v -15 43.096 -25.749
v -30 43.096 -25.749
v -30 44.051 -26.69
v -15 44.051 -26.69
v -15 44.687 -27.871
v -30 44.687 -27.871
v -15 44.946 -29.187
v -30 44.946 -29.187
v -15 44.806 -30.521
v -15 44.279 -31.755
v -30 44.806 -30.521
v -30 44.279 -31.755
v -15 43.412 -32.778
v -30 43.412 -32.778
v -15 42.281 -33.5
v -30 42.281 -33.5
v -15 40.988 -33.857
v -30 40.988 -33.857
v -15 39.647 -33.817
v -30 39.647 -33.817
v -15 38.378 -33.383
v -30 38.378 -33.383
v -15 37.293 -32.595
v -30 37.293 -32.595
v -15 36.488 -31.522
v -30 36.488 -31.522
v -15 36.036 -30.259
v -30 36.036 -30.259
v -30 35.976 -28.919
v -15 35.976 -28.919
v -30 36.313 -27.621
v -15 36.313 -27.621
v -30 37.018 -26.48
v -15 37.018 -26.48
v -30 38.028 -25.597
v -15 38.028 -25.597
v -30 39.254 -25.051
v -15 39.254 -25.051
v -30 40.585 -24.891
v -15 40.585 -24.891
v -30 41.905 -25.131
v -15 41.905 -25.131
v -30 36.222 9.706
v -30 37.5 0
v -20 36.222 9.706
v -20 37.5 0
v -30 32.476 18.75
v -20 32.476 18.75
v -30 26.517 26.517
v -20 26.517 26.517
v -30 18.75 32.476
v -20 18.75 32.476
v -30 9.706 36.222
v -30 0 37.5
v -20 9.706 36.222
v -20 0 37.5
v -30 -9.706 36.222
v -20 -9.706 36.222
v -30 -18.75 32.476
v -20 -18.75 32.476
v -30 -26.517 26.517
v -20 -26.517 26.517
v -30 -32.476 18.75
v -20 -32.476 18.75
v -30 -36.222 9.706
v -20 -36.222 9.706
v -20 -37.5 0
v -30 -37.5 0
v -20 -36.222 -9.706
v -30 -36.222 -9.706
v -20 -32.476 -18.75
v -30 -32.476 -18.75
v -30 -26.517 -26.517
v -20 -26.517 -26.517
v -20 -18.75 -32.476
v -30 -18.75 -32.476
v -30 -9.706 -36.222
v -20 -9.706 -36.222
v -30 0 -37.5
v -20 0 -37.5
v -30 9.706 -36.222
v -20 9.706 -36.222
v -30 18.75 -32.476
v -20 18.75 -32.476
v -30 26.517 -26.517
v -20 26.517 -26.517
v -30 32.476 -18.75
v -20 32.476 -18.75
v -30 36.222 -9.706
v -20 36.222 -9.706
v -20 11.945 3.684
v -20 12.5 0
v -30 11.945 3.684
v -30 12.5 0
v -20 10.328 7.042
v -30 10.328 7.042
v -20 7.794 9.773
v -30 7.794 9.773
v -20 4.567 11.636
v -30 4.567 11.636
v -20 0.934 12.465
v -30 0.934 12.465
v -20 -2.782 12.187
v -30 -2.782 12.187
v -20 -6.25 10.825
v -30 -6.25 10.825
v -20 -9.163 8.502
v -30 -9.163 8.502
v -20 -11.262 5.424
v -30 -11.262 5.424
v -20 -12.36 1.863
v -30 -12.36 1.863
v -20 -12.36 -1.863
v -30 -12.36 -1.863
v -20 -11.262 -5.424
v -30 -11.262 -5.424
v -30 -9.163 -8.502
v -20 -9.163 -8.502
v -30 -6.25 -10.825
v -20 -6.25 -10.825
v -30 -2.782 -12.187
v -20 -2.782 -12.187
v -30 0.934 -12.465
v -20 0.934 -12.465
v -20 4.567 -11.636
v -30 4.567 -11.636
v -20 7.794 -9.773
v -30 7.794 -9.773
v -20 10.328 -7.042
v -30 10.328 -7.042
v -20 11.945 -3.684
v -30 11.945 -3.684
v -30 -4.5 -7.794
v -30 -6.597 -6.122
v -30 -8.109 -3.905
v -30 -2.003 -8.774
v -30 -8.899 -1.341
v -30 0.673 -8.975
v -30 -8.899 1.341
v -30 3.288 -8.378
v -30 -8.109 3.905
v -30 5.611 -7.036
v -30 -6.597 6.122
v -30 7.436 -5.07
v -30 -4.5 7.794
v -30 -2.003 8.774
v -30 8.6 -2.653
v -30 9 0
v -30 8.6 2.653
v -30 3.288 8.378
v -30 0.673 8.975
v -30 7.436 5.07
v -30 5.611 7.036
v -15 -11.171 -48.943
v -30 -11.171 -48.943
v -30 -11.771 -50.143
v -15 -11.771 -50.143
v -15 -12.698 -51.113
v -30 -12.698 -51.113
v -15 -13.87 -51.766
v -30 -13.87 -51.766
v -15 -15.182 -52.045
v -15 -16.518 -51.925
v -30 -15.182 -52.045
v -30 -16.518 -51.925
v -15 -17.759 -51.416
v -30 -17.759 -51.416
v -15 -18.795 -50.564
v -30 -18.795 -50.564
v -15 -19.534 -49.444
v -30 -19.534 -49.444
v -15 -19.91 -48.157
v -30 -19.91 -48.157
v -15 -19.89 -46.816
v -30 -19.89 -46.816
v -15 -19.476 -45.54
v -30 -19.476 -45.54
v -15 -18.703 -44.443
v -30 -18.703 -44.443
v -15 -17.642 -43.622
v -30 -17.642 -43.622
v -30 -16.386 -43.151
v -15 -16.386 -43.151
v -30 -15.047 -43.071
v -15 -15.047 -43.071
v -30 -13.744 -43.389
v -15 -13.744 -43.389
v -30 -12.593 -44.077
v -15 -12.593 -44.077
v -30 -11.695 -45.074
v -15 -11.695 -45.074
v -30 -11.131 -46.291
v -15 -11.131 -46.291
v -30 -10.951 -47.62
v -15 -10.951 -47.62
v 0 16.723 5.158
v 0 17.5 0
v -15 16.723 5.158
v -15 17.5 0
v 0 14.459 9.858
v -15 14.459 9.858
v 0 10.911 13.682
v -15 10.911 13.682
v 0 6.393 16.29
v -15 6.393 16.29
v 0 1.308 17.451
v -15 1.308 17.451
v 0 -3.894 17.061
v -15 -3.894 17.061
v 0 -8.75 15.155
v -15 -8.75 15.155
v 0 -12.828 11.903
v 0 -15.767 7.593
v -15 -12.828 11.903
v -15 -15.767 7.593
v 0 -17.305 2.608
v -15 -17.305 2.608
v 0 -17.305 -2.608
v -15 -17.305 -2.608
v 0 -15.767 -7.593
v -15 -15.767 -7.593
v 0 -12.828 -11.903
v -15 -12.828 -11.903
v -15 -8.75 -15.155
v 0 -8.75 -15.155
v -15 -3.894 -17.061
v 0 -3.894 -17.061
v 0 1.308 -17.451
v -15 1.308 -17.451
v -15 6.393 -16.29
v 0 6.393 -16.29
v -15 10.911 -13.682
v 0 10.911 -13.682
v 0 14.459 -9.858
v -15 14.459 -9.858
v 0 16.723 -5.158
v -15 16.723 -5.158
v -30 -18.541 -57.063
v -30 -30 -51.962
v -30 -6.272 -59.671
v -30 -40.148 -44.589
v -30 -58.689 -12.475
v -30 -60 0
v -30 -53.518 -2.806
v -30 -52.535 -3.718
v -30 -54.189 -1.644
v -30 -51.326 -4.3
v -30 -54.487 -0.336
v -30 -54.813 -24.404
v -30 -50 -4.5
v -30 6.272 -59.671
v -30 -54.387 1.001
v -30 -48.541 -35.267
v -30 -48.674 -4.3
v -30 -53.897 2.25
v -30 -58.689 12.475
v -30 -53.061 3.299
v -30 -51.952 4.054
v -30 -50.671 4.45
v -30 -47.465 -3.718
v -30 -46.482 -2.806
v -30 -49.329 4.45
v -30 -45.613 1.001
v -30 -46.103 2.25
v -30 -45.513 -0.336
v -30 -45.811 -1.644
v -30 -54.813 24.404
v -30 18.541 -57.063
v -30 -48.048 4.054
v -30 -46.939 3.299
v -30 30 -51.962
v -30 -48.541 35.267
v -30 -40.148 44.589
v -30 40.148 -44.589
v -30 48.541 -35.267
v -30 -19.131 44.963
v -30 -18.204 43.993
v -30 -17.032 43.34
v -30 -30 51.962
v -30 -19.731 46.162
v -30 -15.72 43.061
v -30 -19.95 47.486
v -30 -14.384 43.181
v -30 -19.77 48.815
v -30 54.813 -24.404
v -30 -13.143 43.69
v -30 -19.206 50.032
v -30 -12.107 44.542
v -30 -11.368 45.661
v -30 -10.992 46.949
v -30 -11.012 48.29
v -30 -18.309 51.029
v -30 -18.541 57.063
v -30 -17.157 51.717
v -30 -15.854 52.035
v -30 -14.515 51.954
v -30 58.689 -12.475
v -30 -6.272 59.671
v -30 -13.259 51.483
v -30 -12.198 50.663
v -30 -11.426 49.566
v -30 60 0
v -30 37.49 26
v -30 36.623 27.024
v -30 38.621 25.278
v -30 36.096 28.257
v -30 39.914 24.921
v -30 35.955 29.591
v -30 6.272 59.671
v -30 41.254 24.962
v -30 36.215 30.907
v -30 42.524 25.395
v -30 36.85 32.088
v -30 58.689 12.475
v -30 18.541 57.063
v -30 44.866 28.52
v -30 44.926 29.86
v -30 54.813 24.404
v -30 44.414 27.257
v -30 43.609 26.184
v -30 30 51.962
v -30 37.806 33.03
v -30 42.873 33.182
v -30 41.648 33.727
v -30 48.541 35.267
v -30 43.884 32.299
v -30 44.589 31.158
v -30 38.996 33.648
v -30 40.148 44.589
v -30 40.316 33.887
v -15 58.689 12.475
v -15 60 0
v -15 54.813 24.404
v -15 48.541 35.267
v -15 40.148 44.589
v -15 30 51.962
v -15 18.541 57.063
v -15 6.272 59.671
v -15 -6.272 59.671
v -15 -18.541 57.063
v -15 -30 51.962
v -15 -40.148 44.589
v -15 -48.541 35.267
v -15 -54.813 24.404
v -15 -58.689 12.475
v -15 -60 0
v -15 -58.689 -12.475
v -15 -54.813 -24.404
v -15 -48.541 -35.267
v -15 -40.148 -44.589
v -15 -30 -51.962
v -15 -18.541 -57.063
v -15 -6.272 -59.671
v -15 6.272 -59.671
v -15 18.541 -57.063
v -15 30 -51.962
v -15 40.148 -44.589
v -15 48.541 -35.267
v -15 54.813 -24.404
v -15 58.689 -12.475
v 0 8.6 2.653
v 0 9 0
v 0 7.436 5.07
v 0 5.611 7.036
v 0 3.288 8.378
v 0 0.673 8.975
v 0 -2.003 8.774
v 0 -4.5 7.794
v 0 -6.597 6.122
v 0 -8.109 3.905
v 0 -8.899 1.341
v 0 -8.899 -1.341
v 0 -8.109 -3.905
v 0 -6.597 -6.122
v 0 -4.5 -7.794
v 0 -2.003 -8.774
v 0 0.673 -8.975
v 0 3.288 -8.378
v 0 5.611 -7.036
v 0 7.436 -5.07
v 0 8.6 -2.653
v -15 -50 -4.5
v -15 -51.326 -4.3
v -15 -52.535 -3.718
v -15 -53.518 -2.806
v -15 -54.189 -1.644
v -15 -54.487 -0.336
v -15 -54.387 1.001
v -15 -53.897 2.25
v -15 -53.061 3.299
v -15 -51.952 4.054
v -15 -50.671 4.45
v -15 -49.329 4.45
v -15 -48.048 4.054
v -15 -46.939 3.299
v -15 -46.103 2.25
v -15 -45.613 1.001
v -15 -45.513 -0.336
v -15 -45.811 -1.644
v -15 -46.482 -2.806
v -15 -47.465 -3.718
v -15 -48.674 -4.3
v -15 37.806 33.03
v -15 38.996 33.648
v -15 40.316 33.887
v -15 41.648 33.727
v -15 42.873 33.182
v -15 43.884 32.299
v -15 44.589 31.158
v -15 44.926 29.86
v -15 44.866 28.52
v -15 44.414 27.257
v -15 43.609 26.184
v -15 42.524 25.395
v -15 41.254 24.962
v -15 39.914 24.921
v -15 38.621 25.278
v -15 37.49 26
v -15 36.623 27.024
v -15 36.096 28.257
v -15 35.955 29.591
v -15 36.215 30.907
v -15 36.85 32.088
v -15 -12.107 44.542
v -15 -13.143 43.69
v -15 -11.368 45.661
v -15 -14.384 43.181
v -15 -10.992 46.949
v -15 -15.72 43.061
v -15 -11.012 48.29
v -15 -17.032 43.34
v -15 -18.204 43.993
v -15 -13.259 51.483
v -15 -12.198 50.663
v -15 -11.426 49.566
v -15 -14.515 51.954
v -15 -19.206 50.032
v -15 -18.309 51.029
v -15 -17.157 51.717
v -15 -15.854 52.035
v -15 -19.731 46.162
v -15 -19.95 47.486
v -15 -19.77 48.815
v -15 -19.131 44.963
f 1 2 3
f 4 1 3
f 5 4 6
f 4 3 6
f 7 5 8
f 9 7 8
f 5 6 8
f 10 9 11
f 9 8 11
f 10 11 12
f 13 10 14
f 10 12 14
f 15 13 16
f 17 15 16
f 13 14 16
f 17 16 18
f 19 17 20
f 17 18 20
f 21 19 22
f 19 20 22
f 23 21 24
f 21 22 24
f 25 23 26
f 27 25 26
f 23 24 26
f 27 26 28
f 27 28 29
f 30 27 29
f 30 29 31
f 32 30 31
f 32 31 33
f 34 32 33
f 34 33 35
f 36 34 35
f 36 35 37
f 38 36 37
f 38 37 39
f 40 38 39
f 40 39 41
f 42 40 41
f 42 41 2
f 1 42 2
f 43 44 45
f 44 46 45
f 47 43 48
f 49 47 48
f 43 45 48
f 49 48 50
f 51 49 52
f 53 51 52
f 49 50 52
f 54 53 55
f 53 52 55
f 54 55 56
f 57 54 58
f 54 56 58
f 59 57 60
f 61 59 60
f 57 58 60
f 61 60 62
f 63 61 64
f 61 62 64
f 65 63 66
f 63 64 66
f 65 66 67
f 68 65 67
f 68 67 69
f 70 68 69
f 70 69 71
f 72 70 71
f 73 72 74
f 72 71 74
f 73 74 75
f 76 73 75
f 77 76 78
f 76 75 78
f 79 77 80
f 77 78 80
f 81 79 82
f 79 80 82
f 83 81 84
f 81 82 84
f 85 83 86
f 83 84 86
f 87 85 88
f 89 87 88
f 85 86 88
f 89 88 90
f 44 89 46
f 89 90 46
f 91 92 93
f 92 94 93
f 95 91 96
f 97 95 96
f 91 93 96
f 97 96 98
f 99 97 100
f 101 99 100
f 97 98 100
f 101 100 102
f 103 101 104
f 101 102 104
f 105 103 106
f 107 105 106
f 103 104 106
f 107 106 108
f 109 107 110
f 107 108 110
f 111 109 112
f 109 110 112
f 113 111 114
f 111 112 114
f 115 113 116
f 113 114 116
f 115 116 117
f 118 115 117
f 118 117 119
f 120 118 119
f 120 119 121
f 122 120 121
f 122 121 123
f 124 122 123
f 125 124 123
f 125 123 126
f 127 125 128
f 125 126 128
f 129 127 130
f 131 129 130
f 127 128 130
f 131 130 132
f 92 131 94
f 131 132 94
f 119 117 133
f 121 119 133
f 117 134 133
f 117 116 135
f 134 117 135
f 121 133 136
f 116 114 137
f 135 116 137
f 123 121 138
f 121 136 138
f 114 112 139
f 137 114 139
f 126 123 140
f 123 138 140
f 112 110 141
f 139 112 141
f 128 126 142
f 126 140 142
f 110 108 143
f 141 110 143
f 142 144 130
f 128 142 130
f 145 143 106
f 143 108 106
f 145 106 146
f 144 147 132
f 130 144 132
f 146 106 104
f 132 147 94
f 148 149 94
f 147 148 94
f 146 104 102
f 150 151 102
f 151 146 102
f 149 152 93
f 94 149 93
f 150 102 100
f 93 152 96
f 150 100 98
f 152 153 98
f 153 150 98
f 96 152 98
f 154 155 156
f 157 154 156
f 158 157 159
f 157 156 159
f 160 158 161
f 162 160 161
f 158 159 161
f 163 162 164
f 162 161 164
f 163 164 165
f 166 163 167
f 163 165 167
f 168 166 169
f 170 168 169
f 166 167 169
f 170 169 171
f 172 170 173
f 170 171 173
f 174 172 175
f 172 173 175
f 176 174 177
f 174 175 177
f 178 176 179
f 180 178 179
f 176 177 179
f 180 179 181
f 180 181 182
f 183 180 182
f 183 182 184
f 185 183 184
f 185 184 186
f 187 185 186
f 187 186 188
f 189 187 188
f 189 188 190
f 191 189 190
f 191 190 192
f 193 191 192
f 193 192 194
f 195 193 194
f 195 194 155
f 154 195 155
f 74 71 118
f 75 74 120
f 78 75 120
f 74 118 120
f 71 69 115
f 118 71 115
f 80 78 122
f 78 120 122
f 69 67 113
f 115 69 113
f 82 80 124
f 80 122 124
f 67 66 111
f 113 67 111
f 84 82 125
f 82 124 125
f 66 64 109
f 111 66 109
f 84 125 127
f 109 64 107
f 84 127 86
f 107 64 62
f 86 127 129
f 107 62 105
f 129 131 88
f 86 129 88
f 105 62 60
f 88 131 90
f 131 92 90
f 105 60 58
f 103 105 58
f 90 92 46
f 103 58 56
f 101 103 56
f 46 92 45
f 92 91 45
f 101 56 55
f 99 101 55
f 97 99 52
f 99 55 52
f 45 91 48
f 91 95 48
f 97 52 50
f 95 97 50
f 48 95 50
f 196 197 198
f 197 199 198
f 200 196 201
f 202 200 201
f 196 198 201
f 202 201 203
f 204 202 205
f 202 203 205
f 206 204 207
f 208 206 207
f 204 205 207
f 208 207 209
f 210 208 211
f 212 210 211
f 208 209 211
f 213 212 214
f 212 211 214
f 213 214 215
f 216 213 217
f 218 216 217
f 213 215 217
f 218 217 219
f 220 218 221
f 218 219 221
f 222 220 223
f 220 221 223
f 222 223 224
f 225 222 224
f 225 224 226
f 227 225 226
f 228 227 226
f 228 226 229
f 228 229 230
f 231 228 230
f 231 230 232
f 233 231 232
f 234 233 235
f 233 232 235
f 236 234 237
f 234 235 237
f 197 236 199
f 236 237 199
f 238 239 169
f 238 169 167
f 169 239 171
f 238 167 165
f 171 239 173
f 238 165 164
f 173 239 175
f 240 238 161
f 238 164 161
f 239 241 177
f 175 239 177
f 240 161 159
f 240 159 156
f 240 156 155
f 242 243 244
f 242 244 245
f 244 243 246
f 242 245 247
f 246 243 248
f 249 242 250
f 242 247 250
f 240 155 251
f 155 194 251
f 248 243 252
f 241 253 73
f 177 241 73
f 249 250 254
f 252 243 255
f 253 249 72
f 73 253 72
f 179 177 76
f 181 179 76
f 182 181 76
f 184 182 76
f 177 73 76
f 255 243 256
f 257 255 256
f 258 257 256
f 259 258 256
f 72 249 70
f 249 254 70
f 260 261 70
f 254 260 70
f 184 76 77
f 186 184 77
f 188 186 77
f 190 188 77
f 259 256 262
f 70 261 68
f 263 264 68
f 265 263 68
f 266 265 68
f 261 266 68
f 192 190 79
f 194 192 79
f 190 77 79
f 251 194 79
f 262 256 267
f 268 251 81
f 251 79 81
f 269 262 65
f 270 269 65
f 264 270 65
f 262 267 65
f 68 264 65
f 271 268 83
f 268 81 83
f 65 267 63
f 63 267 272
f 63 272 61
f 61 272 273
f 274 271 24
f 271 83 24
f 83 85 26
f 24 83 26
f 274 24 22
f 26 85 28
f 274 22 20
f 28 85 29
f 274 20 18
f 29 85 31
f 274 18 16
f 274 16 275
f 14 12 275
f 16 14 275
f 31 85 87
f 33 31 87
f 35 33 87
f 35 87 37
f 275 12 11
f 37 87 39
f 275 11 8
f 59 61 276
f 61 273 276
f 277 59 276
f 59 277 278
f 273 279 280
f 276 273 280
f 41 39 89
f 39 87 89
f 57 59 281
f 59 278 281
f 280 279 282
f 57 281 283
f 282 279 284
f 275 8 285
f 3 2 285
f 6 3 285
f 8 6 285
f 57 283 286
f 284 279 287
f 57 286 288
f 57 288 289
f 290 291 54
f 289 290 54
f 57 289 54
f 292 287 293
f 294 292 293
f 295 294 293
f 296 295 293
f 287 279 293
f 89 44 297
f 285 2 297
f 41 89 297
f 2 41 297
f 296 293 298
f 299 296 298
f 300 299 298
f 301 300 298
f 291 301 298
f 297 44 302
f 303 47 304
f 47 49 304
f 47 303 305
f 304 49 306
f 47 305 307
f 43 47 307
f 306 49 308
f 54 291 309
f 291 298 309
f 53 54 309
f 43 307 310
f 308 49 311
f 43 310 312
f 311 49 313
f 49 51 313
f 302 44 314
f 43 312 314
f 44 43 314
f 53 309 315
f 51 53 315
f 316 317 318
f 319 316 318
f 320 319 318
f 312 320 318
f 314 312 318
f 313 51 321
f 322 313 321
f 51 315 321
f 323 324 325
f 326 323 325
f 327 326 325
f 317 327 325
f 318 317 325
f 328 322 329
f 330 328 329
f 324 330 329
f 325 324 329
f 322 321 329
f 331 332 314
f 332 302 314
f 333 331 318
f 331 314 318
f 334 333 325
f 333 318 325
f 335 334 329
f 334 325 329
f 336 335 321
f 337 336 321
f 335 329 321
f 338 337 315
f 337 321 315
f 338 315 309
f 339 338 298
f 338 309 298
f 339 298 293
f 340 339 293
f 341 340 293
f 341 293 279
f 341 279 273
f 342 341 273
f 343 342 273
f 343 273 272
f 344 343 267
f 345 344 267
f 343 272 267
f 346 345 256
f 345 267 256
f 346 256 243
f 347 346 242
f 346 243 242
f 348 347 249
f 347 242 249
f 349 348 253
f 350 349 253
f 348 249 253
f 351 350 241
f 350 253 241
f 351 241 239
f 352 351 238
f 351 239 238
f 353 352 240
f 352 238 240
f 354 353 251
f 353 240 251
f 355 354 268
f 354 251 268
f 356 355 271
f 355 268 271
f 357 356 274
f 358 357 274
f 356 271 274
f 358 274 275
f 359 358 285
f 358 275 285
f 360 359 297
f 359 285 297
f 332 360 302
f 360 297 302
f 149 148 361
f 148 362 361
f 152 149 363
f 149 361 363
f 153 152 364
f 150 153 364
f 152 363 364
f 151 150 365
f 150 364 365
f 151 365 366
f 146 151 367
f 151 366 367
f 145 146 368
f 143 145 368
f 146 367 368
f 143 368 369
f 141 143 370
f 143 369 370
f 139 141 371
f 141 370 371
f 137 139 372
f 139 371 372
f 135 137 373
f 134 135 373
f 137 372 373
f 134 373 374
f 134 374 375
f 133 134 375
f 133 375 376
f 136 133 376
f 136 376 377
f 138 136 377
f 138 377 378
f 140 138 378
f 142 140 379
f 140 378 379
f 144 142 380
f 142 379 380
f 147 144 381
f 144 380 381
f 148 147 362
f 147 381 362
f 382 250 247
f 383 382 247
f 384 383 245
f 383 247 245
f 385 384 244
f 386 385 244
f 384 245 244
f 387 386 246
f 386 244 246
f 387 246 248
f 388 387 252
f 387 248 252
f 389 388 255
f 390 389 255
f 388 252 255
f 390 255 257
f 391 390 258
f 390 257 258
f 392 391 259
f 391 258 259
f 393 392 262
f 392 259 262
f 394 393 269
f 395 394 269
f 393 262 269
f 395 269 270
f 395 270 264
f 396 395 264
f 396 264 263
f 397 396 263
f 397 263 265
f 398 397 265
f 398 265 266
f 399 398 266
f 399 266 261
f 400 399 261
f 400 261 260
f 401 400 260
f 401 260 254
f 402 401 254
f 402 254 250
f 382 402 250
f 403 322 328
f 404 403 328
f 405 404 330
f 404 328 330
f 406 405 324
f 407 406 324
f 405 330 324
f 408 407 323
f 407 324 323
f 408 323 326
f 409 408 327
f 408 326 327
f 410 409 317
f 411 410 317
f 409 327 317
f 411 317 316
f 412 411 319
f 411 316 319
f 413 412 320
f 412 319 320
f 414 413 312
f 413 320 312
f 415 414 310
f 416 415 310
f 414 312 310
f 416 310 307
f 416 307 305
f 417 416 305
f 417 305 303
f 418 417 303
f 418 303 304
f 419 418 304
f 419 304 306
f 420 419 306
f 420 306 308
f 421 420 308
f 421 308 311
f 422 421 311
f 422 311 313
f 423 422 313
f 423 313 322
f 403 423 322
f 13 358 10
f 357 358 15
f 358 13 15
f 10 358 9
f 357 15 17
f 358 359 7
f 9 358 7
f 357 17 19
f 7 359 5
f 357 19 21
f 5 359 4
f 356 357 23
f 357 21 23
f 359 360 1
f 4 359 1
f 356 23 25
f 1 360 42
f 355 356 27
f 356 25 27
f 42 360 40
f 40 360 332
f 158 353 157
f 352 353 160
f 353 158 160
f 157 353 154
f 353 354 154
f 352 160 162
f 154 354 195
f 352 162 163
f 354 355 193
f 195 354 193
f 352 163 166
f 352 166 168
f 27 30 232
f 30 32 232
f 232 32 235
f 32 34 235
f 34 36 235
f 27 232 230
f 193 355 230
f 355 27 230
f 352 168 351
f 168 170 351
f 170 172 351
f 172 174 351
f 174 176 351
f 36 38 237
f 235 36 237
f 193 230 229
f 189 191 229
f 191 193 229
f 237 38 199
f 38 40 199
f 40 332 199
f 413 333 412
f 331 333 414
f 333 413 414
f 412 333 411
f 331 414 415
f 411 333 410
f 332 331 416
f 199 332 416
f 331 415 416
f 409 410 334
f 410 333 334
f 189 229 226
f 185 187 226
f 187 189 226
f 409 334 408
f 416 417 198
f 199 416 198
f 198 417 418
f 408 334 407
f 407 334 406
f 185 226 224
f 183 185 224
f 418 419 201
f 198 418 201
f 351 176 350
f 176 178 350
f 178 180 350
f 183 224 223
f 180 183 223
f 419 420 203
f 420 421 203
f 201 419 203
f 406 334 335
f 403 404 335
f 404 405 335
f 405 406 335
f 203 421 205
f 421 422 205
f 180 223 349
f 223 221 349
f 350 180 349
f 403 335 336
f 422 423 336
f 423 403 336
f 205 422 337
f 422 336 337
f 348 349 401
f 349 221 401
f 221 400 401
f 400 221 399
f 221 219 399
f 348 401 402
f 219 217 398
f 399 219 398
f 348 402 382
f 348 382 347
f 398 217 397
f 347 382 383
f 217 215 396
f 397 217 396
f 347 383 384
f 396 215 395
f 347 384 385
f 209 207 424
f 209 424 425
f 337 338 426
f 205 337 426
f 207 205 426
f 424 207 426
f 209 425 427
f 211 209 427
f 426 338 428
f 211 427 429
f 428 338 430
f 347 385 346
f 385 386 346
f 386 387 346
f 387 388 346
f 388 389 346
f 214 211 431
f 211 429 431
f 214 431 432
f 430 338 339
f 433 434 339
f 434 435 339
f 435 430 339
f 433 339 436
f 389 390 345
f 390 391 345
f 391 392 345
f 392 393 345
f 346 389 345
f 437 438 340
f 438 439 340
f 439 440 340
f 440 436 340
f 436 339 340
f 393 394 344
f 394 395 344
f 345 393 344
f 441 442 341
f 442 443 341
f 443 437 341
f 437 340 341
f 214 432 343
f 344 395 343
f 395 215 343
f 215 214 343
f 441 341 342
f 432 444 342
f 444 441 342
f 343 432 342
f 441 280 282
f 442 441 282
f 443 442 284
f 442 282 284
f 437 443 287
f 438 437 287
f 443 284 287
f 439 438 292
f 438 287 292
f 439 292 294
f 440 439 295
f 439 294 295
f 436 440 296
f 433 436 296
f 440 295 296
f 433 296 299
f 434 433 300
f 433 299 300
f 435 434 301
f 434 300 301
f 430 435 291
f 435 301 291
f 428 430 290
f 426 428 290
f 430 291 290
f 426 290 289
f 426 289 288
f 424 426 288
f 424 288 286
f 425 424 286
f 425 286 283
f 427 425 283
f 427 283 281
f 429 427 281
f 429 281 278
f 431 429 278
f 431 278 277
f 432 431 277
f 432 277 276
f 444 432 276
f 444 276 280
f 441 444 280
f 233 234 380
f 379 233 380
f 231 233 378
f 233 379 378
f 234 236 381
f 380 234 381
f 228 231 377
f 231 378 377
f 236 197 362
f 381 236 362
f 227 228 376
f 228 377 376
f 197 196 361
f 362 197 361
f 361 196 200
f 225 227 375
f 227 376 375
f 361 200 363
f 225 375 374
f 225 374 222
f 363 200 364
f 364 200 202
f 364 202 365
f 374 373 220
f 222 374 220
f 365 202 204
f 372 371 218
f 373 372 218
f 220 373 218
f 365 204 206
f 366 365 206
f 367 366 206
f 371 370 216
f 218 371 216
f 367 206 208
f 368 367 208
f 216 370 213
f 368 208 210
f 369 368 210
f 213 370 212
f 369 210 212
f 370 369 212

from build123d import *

# Parameters (mm, degrees)
M8_CLEARANCE_HOLE1_D     = 9
M8_CLEARANCE_HOLE1_DEPTH = 15
CIRPATTERN1_COUNT        = 5


with BuildPart() as part:
    # Sketch2 → Revolve1 (revolve)
    with BuildSketch(Plane.XY):
        Polygon((-30, 9), (0, 9), (0, 17.5), (-15, 17.5), (-15, 60), (-30, 60), (-30, 37.5), (-20, 37.5), (-20, 12.5), (-30, 12.5), align=None)
    revolve(axis=Axis((-30, 0, 0), (1, 0, 0)))

    # M8 Clearance Hole1
    with Locations(Plane(origin=(-15, -50, 0), x_dir=(0, 0, 1), z_dir=(1, 0, 0))):
        with Locations((0, 0)):
            m8_clearance_hole1 = Hole(M8_CLEARANCE_HOLE1_D / 2, depth=M8_CLEARANCE_HOLE1_DEPTH)

    # CirPattern1: M8 Clearance Hole1 ×5 about axis
    cirpattern1_axis = Axis((0, 0, 0), (1, 0, 0))
    for i in range(1, CIRPATTERN1_COUNT):
        add(m8_clearance_hole1.rotate(cirpattern1_axis, i * 360 / CIRPATTERN1_COUNT), mode=Mode.SUBTRACT)


solid = part.part
